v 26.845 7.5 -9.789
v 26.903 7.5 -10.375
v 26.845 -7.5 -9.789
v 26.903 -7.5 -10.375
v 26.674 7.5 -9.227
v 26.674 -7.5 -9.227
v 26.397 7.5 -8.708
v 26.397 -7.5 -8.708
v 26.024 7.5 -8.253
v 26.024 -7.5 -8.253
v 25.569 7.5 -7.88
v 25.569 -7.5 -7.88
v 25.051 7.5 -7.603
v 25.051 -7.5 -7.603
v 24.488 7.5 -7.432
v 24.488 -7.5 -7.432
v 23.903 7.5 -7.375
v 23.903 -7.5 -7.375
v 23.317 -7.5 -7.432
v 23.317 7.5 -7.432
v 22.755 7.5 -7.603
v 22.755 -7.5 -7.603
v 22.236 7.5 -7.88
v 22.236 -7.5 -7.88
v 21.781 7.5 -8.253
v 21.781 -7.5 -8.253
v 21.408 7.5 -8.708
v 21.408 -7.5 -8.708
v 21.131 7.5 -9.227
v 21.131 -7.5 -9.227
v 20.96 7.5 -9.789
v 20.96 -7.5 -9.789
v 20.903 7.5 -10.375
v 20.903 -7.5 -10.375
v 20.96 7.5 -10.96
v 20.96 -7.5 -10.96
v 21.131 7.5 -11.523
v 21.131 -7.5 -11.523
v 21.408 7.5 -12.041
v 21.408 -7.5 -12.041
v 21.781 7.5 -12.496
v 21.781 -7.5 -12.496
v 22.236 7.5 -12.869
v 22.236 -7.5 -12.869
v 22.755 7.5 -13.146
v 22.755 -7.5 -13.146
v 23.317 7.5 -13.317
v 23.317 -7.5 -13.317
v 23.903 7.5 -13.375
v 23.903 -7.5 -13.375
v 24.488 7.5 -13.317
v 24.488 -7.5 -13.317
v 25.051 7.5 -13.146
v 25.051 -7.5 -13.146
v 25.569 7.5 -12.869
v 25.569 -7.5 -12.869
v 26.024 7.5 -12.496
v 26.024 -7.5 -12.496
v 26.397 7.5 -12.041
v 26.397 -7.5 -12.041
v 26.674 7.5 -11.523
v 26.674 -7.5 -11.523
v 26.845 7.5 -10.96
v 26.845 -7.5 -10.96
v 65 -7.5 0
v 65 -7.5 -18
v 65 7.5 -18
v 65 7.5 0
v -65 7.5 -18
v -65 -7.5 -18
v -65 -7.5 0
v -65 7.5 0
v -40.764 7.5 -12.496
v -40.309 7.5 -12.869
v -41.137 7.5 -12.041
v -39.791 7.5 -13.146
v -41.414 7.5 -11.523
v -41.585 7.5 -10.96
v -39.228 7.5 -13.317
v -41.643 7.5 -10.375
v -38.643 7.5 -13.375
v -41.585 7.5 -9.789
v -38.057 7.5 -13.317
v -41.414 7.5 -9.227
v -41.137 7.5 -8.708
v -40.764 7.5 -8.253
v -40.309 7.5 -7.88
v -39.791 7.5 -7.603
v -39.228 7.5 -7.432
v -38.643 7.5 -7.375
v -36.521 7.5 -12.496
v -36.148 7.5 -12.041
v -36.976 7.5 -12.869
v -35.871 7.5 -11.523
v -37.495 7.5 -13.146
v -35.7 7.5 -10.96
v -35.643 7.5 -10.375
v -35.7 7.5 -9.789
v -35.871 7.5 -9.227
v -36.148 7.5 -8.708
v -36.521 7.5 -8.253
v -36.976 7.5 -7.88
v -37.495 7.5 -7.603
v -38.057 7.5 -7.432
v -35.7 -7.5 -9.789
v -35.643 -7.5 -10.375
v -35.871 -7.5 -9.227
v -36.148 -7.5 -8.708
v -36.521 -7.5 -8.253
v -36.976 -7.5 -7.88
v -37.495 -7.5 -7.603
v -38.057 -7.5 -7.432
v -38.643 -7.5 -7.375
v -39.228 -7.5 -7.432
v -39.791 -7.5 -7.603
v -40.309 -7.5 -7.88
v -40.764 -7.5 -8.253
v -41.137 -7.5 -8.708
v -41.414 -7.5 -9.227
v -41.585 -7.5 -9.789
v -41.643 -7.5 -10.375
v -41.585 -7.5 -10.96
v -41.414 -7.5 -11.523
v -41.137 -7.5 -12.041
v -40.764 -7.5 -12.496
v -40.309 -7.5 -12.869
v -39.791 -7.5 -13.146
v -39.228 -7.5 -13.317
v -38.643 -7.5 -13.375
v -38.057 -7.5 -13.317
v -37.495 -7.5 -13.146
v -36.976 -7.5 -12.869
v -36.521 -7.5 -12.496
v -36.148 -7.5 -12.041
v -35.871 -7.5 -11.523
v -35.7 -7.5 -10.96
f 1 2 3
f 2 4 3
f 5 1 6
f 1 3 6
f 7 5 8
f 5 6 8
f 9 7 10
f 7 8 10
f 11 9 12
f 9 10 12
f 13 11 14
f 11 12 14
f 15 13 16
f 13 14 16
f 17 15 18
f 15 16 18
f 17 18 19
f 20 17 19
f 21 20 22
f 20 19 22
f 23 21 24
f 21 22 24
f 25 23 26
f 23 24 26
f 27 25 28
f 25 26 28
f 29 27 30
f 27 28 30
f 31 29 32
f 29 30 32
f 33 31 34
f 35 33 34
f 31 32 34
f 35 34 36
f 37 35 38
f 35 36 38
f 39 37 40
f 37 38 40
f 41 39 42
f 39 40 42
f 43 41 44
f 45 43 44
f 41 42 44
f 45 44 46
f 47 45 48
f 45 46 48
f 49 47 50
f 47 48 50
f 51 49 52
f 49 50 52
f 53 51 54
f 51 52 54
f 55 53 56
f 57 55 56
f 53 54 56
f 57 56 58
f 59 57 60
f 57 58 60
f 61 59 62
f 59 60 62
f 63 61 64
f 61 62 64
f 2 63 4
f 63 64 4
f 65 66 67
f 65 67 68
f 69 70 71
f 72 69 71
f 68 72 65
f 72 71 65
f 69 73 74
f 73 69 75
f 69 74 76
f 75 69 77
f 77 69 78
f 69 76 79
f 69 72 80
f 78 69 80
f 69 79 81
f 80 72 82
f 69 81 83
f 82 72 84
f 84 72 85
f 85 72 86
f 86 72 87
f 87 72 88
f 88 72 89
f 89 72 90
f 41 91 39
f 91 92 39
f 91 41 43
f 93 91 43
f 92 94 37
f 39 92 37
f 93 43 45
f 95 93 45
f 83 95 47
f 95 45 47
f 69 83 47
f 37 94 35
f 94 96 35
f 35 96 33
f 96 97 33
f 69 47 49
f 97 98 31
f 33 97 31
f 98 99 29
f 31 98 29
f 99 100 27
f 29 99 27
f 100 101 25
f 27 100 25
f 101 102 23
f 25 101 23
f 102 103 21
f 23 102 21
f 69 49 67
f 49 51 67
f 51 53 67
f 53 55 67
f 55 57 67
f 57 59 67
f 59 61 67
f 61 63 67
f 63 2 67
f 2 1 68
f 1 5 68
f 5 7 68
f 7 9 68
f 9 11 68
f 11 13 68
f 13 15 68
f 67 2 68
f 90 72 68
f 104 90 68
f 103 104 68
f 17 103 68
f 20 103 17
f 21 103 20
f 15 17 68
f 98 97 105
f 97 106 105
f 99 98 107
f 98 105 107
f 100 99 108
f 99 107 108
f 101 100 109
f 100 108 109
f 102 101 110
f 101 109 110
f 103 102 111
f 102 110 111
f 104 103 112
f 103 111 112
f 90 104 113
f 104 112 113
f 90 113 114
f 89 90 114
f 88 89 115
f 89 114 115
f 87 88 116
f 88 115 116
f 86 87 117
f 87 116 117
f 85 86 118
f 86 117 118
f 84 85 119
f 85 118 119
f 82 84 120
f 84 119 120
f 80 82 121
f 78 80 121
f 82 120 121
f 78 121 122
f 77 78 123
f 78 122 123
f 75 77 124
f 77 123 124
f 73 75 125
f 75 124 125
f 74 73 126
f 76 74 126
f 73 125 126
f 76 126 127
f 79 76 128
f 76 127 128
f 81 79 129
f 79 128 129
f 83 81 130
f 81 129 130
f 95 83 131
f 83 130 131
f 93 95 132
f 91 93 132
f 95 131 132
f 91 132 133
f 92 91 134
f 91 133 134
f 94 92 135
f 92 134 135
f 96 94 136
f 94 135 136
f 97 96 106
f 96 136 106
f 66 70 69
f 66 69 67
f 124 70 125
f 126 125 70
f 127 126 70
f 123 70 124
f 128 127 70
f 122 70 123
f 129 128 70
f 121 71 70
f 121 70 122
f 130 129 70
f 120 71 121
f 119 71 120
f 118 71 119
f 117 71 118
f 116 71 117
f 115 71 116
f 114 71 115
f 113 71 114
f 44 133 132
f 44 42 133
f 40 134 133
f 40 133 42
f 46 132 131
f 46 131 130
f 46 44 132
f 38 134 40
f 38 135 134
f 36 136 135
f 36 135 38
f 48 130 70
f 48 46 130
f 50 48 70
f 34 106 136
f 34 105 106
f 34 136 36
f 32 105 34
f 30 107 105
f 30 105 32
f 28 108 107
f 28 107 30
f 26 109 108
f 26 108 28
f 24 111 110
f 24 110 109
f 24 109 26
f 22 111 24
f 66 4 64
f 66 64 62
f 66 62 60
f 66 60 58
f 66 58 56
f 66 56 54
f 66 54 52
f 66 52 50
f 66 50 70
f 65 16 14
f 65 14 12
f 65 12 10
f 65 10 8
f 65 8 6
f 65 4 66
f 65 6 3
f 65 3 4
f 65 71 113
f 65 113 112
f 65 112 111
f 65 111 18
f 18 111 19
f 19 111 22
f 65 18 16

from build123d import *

# Parameters (mm, degrees)
F0_W          = 130
F0_H          = 18
F0_R          = 3
F1_DEPTH      = 7.5
F2_R          = 3
F3_DEPTH      = 7.501
F3_DEPTH_BACK = 25


with BuildPart() as f1:
    # F0 (on Front) → F1 (new body, symmetric)
    with BuildSketch(Plane.XZ):
        with Locations((0, -9)):
            Rectangle(F0_W, F0_H)
        with Locations((-32.9453274608, -9.836692363)):
            Circle(F0_R, mode=Mode.SUBTRACT)
        with Locations((41.1642305553, -9.836692363)):
            Circle(F0_R, mode=Mode.SUBTRACT)
        with Locations((-32.9453274608, -9.836692363)):
            Circle(F0_R)
        with Locations((41.1642305553, -9.836692363)):
            Circle(F0_R)
    extrude(amount=F1_DEPTH, both=True)

    # F2 (on Front) → F3 (cut, two sides)
    with BuildSketch(Plane.XZ) as f3_sk:
        with Locations((-38.6426560581, -10.3746056557)):
            Circle(F2_R)
        with Locations((23.9025931805, -10.3746056557)):
            Circle(F2_R)
    extrude(amount=-F3_DEPTH, mode=Mode.SUBTRACT)
    extrude(f3_sk.sketch, amount=F3_DEPTH_BACK, mode=Mode.SUBTRACT)


solid = f1.part
